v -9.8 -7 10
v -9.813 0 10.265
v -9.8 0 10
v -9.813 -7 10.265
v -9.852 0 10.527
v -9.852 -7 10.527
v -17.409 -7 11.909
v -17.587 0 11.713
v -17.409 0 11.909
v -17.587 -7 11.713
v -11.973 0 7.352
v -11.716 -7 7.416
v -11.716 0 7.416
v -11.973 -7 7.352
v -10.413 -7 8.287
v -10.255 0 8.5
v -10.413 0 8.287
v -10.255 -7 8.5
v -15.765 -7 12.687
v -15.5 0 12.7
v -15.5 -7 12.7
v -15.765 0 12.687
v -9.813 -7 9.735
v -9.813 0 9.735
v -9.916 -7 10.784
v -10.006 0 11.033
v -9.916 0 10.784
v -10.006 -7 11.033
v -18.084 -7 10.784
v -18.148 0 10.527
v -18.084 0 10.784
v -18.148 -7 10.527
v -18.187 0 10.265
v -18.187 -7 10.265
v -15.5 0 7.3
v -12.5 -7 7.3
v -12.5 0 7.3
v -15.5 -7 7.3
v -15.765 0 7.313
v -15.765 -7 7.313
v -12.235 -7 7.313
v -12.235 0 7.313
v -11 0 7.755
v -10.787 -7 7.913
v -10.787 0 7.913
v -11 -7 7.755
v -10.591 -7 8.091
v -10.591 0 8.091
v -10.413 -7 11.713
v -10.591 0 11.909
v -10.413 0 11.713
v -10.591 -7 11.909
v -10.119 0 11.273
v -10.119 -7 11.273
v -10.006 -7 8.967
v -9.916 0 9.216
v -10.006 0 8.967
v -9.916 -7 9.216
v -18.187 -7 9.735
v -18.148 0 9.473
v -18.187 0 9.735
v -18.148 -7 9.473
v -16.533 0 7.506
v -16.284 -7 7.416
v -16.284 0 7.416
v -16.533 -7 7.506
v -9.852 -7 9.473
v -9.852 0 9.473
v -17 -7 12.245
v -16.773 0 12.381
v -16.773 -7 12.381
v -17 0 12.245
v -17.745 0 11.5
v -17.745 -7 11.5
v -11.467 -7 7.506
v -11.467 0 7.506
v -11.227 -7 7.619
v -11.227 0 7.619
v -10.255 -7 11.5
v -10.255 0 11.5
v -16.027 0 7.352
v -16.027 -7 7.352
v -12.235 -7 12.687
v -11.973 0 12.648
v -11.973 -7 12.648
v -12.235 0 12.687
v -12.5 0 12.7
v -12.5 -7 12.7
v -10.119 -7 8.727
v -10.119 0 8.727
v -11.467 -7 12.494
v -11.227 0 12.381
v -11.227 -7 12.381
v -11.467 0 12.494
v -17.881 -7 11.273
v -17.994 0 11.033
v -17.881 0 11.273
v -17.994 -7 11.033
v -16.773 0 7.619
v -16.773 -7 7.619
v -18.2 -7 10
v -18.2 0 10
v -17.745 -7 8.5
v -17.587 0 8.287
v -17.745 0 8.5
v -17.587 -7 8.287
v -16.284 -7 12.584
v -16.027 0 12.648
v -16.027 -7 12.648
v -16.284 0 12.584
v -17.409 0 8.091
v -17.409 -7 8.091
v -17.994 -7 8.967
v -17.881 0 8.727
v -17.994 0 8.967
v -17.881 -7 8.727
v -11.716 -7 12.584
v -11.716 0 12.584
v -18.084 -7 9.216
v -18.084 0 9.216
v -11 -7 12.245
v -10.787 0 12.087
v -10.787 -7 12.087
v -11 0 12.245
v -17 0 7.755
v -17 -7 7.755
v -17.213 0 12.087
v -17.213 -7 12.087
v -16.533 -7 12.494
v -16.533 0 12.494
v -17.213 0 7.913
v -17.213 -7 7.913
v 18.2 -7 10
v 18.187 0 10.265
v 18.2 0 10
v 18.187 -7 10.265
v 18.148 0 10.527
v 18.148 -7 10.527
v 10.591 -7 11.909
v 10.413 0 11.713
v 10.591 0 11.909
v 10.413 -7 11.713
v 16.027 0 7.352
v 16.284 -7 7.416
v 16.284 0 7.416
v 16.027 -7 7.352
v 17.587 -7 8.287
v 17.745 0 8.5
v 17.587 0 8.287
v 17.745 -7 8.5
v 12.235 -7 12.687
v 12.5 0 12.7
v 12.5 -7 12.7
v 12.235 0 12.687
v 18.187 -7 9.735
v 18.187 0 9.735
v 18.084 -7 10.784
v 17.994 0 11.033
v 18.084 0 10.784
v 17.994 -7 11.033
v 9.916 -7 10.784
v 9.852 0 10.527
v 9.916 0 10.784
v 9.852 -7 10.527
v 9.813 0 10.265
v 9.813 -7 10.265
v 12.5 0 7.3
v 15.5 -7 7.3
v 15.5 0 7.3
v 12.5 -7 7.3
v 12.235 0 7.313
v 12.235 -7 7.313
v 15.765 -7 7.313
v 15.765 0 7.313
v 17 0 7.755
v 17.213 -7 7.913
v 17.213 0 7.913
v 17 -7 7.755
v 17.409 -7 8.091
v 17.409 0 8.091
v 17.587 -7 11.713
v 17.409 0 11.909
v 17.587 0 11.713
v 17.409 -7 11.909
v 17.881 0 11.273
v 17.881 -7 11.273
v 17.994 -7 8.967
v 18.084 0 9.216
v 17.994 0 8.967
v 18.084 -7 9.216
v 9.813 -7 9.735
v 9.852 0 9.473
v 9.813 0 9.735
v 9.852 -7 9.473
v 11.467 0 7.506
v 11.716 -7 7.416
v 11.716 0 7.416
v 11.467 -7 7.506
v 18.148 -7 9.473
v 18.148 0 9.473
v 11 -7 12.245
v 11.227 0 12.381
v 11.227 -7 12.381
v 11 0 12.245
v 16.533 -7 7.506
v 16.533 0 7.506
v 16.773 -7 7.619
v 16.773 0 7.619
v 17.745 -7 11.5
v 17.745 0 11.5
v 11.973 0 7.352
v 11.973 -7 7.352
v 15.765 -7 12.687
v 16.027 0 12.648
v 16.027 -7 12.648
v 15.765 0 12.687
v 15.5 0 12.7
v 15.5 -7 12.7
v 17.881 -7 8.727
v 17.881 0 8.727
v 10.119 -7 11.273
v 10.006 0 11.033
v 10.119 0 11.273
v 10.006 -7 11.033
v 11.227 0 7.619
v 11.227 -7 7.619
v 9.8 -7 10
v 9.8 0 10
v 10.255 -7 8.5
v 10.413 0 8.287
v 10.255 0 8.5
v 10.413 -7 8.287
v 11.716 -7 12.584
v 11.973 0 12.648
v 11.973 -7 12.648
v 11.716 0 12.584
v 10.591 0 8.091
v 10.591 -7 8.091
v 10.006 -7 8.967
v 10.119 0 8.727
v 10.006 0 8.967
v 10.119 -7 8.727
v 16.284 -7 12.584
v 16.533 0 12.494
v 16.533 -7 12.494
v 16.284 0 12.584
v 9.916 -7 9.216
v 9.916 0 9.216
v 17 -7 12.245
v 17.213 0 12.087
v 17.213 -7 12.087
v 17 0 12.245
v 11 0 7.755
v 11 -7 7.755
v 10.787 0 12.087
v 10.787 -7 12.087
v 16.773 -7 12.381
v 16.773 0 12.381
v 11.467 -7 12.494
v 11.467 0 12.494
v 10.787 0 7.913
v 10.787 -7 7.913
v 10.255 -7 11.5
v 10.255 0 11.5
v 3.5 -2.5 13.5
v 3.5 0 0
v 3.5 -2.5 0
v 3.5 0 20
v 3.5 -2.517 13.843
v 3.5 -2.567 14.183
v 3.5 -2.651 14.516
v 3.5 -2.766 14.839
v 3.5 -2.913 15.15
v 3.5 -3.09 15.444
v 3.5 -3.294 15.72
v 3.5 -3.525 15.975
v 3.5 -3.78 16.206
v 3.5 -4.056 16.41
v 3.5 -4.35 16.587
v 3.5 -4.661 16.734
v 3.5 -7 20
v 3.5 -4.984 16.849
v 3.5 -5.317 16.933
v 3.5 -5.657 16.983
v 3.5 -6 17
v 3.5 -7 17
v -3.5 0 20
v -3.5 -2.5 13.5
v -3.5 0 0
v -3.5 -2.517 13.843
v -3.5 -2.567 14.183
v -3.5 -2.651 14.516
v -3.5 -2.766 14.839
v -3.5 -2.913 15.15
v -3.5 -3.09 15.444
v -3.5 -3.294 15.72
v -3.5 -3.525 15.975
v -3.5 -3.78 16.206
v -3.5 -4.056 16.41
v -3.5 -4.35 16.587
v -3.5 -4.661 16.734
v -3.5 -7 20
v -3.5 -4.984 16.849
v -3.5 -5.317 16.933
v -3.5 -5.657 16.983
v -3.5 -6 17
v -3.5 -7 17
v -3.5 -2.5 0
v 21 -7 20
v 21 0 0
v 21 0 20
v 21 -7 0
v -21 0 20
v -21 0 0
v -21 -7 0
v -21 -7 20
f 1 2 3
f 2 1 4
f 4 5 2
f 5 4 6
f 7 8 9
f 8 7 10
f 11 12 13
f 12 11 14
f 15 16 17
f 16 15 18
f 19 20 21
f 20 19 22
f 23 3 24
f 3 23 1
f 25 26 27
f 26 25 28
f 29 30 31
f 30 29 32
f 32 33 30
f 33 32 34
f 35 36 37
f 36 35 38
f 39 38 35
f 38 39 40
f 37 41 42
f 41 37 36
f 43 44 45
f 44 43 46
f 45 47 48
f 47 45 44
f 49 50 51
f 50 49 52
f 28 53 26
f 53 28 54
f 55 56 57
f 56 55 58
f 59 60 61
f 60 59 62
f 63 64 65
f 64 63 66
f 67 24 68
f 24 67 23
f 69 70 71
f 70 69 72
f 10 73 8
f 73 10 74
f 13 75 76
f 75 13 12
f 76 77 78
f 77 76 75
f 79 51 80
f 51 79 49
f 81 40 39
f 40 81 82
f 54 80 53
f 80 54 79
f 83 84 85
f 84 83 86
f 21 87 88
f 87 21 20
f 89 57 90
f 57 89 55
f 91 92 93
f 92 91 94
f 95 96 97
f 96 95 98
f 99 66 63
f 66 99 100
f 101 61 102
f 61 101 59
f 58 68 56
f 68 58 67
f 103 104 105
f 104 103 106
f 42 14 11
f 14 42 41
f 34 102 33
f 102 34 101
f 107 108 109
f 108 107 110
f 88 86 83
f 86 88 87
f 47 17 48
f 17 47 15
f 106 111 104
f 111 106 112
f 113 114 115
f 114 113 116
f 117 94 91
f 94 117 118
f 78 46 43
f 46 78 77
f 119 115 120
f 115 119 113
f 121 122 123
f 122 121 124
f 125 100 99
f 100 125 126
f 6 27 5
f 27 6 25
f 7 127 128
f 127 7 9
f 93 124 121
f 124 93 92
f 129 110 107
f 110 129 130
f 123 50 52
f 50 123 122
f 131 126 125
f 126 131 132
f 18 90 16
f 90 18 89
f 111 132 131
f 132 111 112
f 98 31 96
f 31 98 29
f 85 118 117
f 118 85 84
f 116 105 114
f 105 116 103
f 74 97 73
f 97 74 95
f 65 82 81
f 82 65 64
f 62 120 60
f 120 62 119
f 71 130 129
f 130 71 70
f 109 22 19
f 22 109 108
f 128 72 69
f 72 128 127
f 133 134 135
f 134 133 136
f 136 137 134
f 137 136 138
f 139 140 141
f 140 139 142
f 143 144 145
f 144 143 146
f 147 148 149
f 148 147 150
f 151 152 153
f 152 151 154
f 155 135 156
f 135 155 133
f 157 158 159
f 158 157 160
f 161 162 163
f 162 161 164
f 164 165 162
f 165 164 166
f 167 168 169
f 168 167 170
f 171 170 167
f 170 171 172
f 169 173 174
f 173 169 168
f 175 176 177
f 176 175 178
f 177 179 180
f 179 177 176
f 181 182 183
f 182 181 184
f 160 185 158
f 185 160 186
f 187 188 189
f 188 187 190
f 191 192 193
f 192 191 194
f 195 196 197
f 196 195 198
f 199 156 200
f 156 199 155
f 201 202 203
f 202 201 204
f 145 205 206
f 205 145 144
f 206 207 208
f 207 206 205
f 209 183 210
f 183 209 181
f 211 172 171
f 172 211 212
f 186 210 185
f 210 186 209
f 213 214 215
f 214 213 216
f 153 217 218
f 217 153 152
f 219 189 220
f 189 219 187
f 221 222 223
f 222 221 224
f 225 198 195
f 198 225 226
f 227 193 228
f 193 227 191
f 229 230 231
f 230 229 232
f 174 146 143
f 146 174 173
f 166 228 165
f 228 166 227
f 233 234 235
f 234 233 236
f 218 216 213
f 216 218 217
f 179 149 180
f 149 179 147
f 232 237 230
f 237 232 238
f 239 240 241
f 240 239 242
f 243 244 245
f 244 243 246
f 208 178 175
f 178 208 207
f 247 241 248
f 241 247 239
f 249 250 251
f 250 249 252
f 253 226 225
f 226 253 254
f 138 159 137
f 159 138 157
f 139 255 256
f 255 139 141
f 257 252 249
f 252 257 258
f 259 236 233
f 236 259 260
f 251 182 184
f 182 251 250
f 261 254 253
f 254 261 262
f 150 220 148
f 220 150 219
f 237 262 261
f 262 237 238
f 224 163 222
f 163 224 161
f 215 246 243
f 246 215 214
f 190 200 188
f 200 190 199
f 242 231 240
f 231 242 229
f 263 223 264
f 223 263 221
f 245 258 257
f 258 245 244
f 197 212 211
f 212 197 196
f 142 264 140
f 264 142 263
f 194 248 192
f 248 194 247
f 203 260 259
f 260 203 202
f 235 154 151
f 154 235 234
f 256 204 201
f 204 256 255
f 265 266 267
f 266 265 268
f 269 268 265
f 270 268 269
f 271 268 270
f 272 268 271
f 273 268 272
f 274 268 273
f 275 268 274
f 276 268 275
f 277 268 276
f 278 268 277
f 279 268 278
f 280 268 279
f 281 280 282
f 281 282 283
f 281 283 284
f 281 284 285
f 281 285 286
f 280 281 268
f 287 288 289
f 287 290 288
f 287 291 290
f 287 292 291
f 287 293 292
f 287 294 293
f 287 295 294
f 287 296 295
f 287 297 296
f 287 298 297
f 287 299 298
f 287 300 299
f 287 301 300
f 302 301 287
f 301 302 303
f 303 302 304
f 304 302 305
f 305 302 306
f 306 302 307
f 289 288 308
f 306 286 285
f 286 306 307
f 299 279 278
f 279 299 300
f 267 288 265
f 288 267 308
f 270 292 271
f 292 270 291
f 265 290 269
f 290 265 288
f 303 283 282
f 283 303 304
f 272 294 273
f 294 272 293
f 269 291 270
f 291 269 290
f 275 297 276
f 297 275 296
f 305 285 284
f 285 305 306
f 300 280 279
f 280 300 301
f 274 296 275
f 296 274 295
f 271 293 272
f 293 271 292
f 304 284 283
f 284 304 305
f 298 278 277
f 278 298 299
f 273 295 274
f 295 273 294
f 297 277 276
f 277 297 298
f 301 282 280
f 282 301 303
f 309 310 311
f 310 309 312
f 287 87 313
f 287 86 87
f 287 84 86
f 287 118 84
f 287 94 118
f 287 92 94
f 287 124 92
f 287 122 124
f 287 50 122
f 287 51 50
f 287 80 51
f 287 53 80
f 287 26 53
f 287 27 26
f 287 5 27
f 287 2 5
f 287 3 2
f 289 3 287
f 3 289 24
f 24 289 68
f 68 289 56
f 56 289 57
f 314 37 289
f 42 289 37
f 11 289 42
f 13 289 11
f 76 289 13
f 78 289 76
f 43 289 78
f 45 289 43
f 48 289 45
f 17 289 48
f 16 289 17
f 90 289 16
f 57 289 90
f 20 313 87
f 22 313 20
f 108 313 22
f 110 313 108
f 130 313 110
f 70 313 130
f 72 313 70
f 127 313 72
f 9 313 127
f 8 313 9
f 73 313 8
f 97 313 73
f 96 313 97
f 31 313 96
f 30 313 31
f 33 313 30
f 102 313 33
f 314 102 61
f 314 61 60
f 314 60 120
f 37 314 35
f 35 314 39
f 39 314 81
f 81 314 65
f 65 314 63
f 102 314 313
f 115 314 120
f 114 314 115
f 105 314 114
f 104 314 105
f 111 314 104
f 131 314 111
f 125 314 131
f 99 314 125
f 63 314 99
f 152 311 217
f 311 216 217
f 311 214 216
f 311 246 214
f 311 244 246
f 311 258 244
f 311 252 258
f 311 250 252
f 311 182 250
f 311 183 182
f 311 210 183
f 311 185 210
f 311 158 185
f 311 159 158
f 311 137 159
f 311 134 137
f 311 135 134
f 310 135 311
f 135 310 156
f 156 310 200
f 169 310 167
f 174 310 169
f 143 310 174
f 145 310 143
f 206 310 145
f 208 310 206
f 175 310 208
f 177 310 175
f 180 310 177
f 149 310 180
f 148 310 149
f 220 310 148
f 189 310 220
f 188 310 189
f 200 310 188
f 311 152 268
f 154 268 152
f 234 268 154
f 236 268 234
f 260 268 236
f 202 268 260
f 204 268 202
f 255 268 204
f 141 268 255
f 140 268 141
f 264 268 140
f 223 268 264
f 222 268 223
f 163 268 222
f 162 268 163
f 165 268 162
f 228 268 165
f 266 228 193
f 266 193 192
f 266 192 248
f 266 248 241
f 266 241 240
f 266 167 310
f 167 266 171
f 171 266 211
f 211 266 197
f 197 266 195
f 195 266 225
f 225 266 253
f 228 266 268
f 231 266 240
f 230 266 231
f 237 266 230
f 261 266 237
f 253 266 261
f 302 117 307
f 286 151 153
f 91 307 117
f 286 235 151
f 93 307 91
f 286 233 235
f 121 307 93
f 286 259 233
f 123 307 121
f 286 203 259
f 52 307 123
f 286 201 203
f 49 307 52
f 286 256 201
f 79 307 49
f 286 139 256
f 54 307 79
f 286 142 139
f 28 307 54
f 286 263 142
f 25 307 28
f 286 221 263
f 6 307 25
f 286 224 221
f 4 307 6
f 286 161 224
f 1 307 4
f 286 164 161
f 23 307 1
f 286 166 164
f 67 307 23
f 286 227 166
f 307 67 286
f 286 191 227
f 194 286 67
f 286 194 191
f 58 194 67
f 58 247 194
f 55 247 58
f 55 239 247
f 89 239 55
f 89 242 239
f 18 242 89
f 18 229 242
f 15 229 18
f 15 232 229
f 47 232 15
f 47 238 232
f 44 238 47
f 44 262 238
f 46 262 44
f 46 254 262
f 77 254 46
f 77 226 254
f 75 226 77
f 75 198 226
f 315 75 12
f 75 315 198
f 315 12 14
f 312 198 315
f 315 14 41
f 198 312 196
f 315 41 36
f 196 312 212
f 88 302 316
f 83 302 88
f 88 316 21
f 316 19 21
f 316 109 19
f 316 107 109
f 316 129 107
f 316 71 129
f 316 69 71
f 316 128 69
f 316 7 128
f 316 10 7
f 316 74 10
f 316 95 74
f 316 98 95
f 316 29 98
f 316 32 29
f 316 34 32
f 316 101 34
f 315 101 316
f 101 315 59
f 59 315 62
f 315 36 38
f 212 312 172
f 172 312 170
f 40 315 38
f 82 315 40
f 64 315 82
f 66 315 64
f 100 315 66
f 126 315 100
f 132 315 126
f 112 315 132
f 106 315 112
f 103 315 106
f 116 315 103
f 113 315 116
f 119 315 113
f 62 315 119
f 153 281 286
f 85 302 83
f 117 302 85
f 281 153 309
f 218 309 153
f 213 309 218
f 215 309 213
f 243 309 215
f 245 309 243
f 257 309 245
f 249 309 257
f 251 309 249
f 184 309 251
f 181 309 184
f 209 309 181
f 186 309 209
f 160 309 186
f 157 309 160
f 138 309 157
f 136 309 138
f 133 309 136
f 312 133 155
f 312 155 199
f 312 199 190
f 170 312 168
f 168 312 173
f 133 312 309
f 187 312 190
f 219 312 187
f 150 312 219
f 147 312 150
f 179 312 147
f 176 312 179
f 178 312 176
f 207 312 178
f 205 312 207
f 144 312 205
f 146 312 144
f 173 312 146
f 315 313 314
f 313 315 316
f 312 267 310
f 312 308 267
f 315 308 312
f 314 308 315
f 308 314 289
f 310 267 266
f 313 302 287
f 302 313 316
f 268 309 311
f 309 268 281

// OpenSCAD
$fn = 64; // High resolution for functional printed parts

// Render the solid flat-belt clamp block laying flat on its face
y_flat_belt_gantry_clamp();
//belt_corner_chamfer();


module y_flat_belt_gantry_clamp() {

    // Solid block dimensions scaled so the part lays flat on its face
    block_w = 42; // Wide along X to bridge the rail and keep screws on the flanks
    block_d = 20; // Depth along Y
    block_h = 7; // Total thickness height (clamping surface thickness)
    
    // Extrusion Rail Mounting Specs (M5 Hardware)
    m5_clear_dia = 5.4;   
    m5_head_dia = 9.5;    
    m5_head_depth = 5.0; // Pocket depth to submerge the bolt head completely
    
    // FLAT BELT SLOT SPECS (Horizontal ribbon orientation)
    belt_w = 7.0;       // Width along X to comfortably clear a 6mm wide flat belt
    belt_groove_h = 2.5; // Shallow groove cut from the top face down into the block
    
    translate([0,-block_h,block_d/2])rotate([-90,0,0])union(){
    
    // Flip 90 degrees on its face so the flat grooved track faces upright 
    // and the M5 mounting screws bolt vertically down into the 2020 channel
        color("crimson") difference() {
            // 1. MAIN SOLID BRACKET BODY (Laying wide and flat)
            translate([0, 0, block_h/2])
                cube([block_w, block_d, block_h], center=true);
                
            // 2. VERTICAL MOUNTING SLOTS (Safely isolated on the left and right flanks)
            for (x_offset = [-14, 14]) {
                translate([x_offset, 0, 0]) {
                    hull() {
                        translate([-1.5, 0, -1]) cylinder(d=m5_clear_dia, h=block_h + 2);
                        translate([ 1.5, 0, -1]) cylinder(d=m5_clear_dia, h=block_h + 2);
                    }
                }
            }
            
            // 3. HORIZONTAL FLAT BELT GROOVE (Runs front-to-back along the Y-axis)
            translate([0, 0, block_h - belt_groove_h/2 + 0.1]) 
                cube([belt_w, block_d + 2, belt_groove_h], center=true);
            
            // Rounded notch for belt
            translate([0,0,-belt_groove_h])rotate([0,0,0])belt_corner_chamfer();

            // 4. CALL THE WASHBOARD TEETH SUBTRACTION HERE
            // Shifted slightly along Z to cut right into the floor of the groove
            //translate([0, 0, 0.05]) 
                //washboard(block_d, block_h, belt_groove_h, belt_w);
        }
    } //union
}

module belt_corner_chamfer(belt_width=7){
 difference(){
   cube([belt_width,belt_width*4,belt_width*4], center=true);
   hull() {
   translate([0,-belt_width/2,belt_width/2])rotate([0,90,0])cylinder(d=belt_width, h=belt_width+2, center=true);
   translate([0,belt_width*4,belt_width/2])rotate([0,90,0])cylinder(d=belt_width, h=belt_width+2, center=true);
   translate([0,-belt_width/2,-belt_width*4])rotate([0,90,0])cylinder(d=belt_width, h=belt_width+2, center=true);
   }
 }
}

// Added parameters to the module so it inherits the master dimensions cleanly
module washboard(block_d, block_h, belt_groove_h, belt_w) {
    // 2mm pitch pattern matching standard GT2 timing belt profiles
    for (y_tooth = [-block_d/2 : 2 : block_d/2]) {
        translate([0, y_tooth, block_h - belt_groove_h])
            rotate([0, 90, 0])
                cylinder(d=1.2, h=belt_w + 0.2, center=true, $fn=4); // Diamond washboard ridges
    }
}
